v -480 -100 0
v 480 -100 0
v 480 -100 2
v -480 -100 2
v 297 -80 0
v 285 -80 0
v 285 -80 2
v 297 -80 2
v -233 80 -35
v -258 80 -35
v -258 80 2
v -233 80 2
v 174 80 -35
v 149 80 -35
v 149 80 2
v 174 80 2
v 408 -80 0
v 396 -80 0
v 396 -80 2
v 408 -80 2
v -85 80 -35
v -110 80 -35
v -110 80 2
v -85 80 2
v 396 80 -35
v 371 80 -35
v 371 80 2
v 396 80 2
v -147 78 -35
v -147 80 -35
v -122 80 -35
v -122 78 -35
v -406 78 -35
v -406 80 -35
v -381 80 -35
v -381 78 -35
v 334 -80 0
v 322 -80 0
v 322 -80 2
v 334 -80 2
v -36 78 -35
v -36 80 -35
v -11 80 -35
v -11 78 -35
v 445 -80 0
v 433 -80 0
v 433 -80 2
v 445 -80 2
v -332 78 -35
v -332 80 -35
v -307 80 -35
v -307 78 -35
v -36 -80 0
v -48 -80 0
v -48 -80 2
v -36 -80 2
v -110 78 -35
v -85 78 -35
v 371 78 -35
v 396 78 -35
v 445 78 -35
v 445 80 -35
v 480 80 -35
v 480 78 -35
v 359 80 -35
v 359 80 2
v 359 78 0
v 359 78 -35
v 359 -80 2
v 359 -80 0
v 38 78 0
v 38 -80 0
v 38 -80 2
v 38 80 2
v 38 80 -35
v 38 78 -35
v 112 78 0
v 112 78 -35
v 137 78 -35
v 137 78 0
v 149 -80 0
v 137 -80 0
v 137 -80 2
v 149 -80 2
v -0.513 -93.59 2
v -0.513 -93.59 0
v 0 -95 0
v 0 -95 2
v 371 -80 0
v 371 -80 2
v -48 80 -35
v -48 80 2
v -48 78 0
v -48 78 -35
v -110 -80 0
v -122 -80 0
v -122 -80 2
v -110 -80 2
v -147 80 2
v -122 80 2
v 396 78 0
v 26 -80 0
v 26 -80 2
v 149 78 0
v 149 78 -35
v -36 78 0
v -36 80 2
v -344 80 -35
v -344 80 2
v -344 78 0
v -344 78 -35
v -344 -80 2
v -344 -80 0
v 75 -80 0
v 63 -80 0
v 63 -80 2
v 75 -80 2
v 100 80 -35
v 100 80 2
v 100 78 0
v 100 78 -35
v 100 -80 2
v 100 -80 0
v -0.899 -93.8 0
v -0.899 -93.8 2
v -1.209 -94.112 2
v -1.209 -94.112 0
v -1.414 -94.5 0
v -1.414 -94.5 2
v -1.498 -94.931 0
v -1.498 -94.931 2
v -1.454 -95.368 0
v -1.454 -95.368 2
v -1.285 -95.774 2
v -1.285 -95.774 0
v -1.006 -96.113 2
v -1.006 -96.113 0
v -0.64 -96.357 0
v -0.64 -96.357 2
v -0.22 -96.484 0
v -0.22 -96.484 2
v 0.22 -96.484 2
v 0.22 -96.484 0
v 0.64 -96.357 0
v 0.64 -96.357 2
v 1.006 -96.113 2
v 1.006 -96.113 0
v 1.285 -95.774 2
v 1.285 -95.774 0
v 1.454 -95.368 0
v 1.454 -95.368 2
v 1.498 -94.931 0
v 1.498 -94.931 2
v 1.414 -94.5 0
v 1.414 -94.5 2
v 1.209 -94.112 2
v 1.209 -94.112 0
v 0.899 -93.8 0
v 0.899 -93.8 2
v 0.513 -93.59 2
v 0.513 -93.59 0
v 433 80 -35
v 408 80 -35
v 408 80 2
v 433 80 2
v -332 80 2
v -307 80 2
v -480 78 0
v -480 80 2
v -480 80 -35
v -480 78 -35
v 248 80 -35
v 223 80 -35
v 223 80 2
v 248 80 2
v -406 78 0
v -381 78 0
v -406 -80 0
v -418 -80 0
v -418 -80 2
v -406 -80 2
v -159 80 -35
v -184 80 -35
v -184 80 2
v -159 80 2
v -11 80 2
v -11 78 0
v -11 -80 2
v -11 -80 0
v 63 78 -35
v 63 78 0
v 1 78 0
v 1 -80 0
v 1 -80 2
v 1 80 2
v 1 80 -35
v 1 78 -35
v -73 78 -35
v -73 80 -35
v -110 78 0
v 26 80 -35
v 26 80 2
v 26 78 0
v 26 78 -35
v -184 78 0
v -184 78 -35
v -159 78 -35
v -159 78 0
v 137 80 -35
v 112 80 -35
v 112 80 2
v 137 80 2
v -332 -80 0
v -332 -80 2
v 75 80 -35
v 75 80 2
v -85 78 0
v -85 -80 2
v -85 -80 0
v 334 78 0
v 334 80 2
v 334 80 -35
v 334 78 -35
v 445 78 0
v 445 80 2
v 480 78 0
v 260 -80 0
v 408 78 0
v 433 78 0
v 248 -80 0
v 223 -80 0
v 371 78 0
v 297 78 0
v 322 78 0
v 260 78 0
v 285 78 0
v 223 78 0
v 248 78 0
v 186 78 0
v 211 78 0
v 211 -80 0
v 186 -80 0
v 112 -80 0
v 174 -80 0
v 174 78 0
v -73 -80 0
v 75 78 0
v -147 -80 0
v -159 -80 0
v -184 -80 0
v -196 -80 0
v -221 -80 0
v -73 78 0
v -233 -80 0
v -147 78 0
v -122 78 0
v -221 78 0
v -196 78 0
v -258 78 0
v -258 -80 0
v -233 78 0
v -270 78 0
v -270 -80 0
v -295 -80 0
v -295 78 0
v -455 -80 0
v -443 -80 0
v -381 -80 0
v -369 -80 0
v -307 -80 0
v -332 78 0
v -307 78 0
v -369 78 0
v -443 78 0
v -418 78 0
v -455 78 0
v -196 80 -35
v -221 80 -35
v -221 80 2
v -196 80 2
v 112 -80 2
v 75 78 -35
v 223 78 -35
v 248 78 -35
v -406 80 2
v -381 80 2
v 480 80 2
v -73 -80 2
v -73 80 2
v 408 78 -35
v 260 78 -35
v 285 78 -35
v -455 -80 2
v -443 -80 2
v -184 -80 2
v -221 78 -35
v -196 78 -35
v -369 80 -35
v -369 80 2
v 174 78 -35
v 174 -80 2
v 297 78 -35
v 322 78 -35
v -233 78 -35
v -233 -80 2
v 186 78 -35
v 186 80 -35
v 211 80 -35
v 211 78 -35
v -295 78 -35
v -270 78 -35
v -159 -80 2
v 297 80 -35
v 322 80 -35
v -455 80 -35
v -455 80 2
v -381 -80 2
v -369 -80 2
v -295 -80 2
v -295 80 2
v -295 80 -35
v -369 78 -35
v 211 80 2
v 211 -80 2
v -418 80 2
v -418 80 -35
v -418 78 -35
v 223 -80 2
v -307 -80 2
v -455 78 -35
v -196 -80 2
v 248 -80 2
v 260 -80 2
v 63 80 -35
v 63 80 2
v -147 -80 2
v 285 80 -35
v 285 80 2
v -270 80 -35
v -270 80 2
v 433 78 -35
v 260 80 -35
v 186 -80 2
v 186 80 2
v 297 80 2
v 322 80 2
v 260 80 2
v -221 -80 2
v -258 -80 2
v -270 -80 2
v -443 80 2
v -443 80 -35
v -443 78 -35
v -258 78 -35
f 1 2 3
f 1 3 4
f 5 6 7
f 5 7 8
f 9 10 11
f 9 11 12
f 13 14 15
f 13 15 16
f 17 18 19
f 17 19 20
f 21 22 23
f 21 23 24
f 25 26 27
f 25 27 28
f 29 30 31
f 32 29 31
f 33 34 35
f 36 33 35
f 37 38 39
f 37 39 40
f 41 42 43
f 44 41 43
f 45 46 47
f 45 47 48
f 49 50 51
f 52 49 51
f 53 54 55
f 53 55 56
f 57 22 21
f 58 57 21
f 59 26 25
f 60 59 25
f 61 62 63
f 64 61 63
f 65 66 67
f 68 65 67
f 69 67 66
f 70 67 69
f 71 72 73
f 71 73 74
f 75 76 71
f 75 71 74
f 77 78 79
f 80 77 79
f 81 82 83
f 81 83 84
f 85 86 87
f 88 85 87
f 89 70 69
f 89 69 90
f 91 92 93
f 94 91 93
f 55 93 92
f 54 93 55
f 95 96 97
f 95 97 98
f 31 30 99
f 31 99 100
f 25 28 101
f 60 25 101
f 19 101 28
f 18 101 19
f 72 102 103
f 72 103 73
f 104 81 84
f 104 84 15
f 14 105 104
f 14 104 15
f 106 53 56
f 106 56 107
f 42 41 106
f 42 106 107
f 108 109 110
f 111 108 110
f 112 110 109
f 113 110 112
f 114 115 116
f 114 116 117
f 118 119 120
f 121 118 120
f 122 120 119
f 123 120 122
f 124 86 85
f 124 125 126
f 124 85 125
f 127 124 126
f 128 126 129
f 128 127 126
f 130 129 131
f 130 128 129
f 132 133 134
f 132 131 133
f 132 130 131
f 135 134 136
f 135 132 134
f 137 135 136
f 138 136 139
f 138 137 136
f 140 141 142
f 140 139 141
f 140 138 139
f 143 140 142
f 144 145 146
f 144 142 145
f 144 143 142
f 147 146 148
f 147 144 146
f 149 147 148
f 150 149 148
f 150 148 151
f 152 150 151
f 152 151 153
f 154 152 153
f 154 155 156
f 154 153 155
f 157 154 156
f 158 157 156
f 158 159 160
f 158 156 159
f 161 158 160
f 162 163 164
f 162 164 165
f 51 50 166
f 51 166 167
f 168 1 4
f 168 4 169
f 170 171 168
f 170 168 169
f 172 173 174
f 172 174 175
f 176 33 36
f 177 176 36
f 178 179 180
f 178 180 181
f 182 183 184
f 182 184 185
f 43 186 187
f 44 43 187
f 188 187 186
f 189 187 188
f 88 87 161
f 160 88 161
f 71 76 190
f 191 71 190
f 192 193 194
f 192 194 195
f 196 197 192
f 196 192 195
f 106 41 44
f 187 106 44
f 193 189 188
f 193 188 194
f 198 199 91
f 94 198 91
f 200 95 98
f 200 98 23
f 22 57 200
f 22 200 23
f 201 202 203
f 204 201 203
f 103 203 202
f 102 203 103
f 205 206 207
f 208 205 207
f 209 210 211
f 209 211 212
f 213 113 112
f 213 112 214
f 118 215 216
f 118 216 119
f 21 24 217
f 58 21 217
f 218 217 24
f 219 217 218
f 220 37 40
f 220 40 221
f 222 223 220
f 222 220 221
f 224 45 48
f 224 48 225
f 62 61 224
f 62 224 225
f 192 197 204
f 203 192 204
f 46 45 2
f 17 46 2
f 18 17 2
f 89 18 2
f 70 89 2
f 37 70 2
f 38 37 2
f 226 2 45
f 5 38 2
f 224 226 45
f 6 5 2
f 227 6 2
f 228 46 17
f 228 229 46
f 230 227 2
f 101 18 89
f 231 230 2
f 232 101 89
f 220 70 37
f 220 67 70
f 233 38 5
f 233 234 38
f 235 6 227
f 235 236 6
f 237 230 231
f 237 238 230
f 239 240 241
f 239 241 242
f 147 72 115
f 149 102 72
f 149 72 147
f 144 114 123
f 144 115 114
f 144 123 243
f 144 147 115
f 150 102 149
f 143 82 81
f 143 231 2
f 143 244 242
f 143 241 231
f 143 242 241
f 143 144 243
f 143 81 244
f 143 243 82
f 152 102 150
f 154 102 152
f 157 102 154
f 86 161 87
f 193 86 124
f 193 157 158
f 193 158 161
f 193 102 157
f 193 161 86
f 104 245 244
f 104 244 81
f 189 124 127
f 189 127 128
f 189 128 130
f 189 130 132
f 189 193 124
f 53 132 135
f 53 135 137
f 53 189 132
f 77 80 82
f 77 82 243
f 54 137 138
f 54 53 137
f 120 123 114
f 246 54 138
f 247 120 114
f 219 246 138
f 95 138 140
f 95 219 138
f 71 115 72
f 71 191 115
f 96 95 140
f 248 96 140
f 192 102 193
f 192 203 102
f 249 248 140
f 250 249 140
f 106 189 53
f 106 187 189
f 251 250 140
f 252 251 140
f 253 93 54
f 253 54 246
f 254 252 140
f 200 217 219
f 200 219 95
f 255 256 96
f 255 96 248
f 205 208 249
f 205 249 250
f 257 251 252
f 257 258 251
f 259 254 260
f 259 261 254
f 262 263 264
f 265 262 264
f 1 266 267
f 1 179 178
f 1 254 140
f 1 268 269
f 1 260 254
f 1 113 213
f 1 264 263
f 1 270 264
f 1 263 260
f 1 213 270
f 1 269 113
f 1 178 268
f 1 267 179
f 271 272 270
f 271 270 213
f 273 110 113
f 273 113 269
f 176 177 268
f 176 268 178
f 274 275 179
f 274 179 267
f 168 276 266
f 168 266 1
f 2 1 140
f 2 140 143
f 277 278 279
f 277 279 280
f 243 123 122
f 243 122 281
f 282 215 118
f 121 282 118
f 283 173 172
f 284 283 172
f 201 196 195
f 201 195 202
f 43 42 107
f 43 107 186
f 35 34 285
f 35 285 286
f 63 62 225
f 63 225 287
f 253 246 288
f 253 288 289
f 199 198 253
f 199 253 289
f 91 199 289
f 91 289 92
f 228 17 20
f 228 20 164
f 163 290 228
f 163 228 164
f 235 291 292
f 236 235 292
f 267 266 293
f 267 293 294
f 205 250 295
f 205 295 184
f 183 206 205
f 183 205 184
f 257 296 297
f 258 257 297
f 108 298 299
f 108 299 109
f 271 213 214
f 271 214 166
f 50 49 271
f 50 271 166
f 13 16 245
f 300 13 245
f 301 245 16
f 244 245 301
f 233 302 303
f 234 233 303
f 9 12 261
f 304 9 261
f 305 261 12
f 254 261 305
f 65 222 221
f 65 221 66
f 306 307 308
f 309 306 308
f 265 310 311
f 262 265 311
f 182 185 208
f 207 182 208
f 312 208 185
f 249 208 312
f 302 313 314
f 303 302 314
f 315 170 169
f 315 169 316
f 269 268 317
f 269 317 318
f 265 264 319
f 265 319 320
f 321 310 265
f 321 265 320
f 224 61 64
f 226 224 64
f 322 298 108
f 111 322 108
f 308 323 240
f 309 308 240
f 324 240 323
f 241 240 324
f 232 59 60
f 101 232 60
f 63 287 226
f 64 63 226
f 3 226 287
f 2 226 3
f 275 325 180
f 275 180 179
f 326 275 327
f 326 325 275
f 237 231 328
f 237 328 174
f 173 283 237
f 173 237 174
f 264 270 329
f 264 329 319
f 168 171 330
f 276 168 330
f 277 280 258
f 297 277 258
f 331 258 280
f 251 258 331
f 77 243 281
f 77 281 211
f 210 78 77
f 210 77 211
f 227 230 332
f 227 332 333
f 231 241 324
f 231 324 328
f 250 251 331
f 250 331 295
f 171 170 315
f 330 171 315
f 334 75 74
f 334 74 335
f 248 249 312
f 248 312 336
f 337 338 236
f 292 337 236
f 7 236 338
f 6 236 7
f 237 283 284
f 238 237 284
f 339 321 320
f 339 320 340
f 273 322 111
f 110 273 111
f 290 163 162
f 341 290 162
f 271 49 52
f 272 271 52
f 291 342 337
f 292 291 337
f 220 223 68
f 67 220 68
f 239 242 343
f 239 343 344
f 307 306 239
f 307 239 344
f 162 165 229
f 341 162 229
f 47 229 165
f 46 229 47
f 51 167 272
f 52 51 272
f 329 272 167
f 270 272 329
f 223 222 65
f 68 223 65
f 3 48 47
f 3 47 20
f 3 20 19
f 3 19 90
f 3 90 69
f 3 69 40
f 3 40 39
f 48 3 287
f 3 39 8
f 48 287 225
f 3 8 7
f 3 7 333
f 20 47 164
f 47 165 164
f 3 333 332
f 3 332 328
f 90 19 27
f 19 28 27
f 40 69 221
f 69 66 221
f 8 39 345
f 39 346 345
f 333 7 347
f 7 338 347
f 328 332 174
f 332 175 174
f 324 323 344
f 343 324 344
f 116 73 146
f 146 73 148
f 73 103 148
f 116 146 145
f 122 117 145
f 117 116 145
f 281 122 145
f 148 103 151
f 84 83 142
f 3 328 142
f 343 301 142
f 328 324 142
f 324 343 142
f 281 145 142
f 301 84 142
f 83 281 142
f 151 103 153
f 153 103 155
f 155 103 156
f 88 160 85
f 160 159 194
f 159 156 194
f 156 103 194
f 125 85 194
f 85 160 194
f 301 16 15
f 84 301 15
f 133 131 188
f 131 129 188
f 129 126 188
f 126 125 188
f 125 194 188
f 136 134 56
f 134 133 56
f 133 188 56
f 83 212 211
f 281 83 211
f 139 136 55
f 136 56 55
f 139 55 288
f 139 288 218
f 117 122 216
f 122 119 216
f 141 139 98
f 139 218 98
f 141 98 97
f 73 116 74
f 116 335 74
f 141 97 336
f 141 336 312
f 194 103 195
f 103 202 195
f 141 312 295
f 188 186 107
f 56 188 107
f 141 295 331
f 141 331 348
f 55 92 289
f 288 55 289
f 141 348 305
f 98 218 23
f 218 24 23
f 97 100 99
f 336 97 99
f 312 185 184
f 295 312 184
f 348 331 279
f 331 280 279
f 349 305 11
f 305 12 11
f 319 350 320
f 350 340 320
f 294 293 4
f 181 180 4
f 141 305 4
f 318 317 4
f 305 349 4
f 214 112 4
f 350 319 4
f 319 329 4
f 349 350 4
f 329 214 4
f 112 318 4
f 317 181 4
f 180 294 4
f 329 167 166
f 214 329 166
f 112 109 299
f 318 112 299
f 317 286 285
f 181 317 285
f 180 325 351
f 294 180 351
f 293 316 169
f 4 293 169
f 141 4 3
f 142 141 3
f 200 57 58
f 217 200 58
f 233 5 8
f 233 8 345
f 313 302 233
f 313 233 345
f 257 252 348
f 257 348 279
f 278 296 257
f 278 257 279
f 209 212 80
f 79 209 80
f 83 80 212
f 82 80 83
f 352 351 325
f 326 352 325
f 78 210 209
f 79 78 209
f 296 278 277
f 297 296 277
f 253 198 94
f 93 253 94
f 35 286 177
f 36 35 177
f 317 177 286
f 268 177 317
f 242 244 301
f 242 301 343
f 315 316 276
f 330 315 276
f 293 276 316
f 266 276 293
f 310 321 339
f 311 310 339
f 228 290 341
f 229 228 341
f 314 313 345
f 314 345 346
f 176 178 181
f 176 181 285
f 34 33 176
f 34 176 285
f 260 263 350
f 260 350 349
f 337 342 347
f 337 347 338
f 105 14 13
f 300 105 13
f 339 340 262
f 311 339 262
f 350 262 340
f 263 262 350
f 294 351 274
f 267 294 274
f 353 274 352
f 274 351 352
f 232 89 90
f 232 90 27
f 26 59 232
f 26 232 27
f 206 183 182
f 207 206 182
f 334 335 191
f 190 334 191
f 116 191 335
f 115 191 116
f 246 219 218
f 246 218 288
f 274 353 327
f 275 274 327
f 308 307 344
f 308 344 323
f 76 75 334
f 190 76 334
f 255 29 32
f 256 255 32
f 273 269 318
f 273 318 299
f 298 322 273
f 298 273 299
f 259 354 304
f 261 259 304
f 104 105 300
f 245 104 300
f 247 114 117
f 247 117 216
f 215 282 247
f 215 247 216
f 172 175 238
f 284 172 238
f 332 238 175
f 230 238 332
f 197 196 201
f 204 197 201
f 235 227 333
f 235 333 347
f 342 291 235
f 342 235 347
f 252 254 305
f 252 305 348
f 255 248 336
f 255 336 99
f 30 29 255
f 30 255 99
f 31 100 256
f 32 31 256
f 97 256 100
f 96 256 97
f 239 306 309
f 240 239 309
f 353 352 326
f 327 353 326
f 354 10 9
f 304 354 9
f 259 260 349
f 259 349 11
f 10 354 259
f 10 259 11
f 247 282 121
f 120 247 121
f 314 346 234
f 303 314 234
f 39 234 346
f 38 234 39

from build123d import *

# Parameters (mm, degrees)
SKETCH1_R           = 1.5
BOSS_EXTRUDE1_DEPTH = 2
SKETCH4_W           = 25
SKETCH4_H           = 35
SKETCH4_W_2         = 35
BOSS_EXTRUDE4_DEPTH = 2
BOSS_EXTRUDE5_START = -2
BOSS_EXTRUDE5_DEPTH = 2


with BuildPart() as part:
    # Sketch1 → Boss-Extrude1 (new body)
    with BuildSketch(Plane.XY):
        Polygon((-480, 80), (-455, 80), (-455, -80), (-443, -80), (-443, 80), (-418, 80), (-418, -80), (-406, -80), (-406, 80), (-381, 80), (-381, -80), (-369, -80), (-369, 80), (-344, 80), (-344, -80), (-332, -80), (-332, 80), (-307, 80), (-307, -80), (-295, -80), (-295, 80), (-270, 80), (-270, -80), (-258, -80), (-258, 80), (-233, 80), (-233, -80), (-221, -80), (-221, 80), (-196, 80), (-196, -80), (-184, -80), (-184, 80), (-159, 80), (-159, -80), (-147, -80), (-147, 80), (-122, 80), (-122, -80), (-110, -80), (-110, 80), (-85, 80), (-85, -80), (-73, -80), (-73, 80), (-48, 80), (-48, -80), (-36, -80), (-36, 80), (-11, 80), (-11, -80), (1, -80), (1, 80), (26, 80), (26, -80), (38, -80), (38, 80), (63, 80), (63, -80), (75, -80), (75, 80), (100, 80), (100, -80), (112, -80), (112, 80), (137, 80), (137, -80), (149, -80), (149, 80), (174, 80), (174, -80), (186, -80), (186, 80), (211, 80), (211, -80), (223, -80), (223, 80), (248, 80), (248, -80), (260, -80), (260, 80), (285, 80), (285, -80), (297, -80), (297, 80), (322, 80), (322, -80), (334, -80), (334, 80), (359, 80), (359, -80), (371, -80), (371, 80), (396, 80), (396, -80), (408, -80), (408, 80), (433, 80), (433, -80), (445, -80), (445, 80), (480, 80), (480, -100), (-480, -100), align=None)
        with Locations((0, -95)):
            Circle(SKETCH1_R, mode=Mode.SUBTRACT)
    extrude(amount=BOSS_EXTRUDE1_DEPTH)

    # Sketch4 → Boss-Extrude4 (add)
    with BuildSketch(Plane(origin=(0, 80, 0), x_dir=(1, 0, 0), z_dir=(0, 1, 0))):
        with Locations((-430.5, 17.5)):
            Rectangle(SKETCH4_W, SKETCH4_H)
        with Locations((-467.5, 17.5)):
            Rectangle(SKETCH4_W, SKETCH4_H)
        with Locations((-393.5, 17.5)):
            Rectangle(SKETCH4_W, SKETCH4_H)
        with Locations((-356.5, 17.5)):
            Rectangle(SKETCH4_W, SKETCH4_H)
        with Locations((-319.5, 17.5)):
            Rectangle(SKETCH4_W, SKETCH4_H)
        with Locations((-282.5, 17.5)):
            Rectangle(SKETCH4_W, SKETCH4_H)
        with Locations((-245.5, 17.5)):
            Rectangle(SKETCH4_W, SKETCH4_H)
        with Locations((-208.5, 17.5)):
            Rectangle(SKETCH4_W, SKETCH4_H)
        with Locations((-171.5, 17.5)):
            Rectangle(SKETCH4_W, SKETCH4_H)
        with Locations((-134.5, 17.5)):
            Rectangle(SKETCH4_W, SKETCH4_H)
        with Locations((-97.5, 17.5)):
            Rectangle(SKETCH4_W, SKETCH4_H)
        with Locations((-60.5, 17.5)):
            Rectangle(SKETCH4_W, SKETCH4_H)
        with Locations((-23.5, 17.5)):
            Rectangle(SKETCH4_W, SKETCH4_H)
        with Locations((13.5, 17.5)):
            Rectangle(SKETCH4_W, SKETCH4_H)
        with Locations((50.5, 17.5)):
            Rectangle(SKETCH4_W, SKETCH4_H)
        with Locations((87.5, 17.5)):
            Rectangle(SKETCH4_W, SKETCH4_H)
        with Locations((124.5, 17.5)):
            Rectangle(SKETCH4_W, SKETCH4_H)
        with Locations((161.5, 17.5)):
            Rectangle(SKETCH4_W, SKETCH4_H)
        with Locations((198.5, 17.5)):
            Rectangle(SKETCH4_W, SKETCH4_H)
        with Locations((235.5, 17.5)):
            Rectangle(SKETCH4_W, SKETCH4_H)
        with Locations((272.5, 17.5)):
            Rectangle(SKETCH4_W, SKETCH4_H)
        with Locations((309.5, 17.5)):
            Rectangle(SKETCH4_W, SKETCH4_H)
        with Locations((346.5, 17.5)):
            Rectangle(SKETCH4_W, SKETCH4_H)
        with Locations((383.5, 17.5)):
            Rectangle(SKETCH4_W, SKETCH4_H)
        with Locations((420.5, 17.5)):
            Rectangle(SKETCH4_W, SKETCH4_H)
        with Locations((462.5, 17.5)):
            Rectangle(SKETCH4_W_2, SKETCH4_H)
    extrude(amount=-BOSS_EXTRUDE4_DEPTH)

    # Sketch5 → Boss-Extrude5 (add)
    with BuildSketch(Plane.XY.offset(2).offset(BOSS_EXTRUDE5_START)):
        with BuildLine():
            Line((0, -95), (0.513030215, -93.590461069))
            ThreePointArc((0.513030215, -93.590461069), (0, -93.5), (-0.513030215, -93.590461069))
            Line((-0.513030215, -93.590461069), (0, -95))
        make_face()
    extrude(amount=BOSS_EXTRUDE5_DEPTH)


solid = part.part
